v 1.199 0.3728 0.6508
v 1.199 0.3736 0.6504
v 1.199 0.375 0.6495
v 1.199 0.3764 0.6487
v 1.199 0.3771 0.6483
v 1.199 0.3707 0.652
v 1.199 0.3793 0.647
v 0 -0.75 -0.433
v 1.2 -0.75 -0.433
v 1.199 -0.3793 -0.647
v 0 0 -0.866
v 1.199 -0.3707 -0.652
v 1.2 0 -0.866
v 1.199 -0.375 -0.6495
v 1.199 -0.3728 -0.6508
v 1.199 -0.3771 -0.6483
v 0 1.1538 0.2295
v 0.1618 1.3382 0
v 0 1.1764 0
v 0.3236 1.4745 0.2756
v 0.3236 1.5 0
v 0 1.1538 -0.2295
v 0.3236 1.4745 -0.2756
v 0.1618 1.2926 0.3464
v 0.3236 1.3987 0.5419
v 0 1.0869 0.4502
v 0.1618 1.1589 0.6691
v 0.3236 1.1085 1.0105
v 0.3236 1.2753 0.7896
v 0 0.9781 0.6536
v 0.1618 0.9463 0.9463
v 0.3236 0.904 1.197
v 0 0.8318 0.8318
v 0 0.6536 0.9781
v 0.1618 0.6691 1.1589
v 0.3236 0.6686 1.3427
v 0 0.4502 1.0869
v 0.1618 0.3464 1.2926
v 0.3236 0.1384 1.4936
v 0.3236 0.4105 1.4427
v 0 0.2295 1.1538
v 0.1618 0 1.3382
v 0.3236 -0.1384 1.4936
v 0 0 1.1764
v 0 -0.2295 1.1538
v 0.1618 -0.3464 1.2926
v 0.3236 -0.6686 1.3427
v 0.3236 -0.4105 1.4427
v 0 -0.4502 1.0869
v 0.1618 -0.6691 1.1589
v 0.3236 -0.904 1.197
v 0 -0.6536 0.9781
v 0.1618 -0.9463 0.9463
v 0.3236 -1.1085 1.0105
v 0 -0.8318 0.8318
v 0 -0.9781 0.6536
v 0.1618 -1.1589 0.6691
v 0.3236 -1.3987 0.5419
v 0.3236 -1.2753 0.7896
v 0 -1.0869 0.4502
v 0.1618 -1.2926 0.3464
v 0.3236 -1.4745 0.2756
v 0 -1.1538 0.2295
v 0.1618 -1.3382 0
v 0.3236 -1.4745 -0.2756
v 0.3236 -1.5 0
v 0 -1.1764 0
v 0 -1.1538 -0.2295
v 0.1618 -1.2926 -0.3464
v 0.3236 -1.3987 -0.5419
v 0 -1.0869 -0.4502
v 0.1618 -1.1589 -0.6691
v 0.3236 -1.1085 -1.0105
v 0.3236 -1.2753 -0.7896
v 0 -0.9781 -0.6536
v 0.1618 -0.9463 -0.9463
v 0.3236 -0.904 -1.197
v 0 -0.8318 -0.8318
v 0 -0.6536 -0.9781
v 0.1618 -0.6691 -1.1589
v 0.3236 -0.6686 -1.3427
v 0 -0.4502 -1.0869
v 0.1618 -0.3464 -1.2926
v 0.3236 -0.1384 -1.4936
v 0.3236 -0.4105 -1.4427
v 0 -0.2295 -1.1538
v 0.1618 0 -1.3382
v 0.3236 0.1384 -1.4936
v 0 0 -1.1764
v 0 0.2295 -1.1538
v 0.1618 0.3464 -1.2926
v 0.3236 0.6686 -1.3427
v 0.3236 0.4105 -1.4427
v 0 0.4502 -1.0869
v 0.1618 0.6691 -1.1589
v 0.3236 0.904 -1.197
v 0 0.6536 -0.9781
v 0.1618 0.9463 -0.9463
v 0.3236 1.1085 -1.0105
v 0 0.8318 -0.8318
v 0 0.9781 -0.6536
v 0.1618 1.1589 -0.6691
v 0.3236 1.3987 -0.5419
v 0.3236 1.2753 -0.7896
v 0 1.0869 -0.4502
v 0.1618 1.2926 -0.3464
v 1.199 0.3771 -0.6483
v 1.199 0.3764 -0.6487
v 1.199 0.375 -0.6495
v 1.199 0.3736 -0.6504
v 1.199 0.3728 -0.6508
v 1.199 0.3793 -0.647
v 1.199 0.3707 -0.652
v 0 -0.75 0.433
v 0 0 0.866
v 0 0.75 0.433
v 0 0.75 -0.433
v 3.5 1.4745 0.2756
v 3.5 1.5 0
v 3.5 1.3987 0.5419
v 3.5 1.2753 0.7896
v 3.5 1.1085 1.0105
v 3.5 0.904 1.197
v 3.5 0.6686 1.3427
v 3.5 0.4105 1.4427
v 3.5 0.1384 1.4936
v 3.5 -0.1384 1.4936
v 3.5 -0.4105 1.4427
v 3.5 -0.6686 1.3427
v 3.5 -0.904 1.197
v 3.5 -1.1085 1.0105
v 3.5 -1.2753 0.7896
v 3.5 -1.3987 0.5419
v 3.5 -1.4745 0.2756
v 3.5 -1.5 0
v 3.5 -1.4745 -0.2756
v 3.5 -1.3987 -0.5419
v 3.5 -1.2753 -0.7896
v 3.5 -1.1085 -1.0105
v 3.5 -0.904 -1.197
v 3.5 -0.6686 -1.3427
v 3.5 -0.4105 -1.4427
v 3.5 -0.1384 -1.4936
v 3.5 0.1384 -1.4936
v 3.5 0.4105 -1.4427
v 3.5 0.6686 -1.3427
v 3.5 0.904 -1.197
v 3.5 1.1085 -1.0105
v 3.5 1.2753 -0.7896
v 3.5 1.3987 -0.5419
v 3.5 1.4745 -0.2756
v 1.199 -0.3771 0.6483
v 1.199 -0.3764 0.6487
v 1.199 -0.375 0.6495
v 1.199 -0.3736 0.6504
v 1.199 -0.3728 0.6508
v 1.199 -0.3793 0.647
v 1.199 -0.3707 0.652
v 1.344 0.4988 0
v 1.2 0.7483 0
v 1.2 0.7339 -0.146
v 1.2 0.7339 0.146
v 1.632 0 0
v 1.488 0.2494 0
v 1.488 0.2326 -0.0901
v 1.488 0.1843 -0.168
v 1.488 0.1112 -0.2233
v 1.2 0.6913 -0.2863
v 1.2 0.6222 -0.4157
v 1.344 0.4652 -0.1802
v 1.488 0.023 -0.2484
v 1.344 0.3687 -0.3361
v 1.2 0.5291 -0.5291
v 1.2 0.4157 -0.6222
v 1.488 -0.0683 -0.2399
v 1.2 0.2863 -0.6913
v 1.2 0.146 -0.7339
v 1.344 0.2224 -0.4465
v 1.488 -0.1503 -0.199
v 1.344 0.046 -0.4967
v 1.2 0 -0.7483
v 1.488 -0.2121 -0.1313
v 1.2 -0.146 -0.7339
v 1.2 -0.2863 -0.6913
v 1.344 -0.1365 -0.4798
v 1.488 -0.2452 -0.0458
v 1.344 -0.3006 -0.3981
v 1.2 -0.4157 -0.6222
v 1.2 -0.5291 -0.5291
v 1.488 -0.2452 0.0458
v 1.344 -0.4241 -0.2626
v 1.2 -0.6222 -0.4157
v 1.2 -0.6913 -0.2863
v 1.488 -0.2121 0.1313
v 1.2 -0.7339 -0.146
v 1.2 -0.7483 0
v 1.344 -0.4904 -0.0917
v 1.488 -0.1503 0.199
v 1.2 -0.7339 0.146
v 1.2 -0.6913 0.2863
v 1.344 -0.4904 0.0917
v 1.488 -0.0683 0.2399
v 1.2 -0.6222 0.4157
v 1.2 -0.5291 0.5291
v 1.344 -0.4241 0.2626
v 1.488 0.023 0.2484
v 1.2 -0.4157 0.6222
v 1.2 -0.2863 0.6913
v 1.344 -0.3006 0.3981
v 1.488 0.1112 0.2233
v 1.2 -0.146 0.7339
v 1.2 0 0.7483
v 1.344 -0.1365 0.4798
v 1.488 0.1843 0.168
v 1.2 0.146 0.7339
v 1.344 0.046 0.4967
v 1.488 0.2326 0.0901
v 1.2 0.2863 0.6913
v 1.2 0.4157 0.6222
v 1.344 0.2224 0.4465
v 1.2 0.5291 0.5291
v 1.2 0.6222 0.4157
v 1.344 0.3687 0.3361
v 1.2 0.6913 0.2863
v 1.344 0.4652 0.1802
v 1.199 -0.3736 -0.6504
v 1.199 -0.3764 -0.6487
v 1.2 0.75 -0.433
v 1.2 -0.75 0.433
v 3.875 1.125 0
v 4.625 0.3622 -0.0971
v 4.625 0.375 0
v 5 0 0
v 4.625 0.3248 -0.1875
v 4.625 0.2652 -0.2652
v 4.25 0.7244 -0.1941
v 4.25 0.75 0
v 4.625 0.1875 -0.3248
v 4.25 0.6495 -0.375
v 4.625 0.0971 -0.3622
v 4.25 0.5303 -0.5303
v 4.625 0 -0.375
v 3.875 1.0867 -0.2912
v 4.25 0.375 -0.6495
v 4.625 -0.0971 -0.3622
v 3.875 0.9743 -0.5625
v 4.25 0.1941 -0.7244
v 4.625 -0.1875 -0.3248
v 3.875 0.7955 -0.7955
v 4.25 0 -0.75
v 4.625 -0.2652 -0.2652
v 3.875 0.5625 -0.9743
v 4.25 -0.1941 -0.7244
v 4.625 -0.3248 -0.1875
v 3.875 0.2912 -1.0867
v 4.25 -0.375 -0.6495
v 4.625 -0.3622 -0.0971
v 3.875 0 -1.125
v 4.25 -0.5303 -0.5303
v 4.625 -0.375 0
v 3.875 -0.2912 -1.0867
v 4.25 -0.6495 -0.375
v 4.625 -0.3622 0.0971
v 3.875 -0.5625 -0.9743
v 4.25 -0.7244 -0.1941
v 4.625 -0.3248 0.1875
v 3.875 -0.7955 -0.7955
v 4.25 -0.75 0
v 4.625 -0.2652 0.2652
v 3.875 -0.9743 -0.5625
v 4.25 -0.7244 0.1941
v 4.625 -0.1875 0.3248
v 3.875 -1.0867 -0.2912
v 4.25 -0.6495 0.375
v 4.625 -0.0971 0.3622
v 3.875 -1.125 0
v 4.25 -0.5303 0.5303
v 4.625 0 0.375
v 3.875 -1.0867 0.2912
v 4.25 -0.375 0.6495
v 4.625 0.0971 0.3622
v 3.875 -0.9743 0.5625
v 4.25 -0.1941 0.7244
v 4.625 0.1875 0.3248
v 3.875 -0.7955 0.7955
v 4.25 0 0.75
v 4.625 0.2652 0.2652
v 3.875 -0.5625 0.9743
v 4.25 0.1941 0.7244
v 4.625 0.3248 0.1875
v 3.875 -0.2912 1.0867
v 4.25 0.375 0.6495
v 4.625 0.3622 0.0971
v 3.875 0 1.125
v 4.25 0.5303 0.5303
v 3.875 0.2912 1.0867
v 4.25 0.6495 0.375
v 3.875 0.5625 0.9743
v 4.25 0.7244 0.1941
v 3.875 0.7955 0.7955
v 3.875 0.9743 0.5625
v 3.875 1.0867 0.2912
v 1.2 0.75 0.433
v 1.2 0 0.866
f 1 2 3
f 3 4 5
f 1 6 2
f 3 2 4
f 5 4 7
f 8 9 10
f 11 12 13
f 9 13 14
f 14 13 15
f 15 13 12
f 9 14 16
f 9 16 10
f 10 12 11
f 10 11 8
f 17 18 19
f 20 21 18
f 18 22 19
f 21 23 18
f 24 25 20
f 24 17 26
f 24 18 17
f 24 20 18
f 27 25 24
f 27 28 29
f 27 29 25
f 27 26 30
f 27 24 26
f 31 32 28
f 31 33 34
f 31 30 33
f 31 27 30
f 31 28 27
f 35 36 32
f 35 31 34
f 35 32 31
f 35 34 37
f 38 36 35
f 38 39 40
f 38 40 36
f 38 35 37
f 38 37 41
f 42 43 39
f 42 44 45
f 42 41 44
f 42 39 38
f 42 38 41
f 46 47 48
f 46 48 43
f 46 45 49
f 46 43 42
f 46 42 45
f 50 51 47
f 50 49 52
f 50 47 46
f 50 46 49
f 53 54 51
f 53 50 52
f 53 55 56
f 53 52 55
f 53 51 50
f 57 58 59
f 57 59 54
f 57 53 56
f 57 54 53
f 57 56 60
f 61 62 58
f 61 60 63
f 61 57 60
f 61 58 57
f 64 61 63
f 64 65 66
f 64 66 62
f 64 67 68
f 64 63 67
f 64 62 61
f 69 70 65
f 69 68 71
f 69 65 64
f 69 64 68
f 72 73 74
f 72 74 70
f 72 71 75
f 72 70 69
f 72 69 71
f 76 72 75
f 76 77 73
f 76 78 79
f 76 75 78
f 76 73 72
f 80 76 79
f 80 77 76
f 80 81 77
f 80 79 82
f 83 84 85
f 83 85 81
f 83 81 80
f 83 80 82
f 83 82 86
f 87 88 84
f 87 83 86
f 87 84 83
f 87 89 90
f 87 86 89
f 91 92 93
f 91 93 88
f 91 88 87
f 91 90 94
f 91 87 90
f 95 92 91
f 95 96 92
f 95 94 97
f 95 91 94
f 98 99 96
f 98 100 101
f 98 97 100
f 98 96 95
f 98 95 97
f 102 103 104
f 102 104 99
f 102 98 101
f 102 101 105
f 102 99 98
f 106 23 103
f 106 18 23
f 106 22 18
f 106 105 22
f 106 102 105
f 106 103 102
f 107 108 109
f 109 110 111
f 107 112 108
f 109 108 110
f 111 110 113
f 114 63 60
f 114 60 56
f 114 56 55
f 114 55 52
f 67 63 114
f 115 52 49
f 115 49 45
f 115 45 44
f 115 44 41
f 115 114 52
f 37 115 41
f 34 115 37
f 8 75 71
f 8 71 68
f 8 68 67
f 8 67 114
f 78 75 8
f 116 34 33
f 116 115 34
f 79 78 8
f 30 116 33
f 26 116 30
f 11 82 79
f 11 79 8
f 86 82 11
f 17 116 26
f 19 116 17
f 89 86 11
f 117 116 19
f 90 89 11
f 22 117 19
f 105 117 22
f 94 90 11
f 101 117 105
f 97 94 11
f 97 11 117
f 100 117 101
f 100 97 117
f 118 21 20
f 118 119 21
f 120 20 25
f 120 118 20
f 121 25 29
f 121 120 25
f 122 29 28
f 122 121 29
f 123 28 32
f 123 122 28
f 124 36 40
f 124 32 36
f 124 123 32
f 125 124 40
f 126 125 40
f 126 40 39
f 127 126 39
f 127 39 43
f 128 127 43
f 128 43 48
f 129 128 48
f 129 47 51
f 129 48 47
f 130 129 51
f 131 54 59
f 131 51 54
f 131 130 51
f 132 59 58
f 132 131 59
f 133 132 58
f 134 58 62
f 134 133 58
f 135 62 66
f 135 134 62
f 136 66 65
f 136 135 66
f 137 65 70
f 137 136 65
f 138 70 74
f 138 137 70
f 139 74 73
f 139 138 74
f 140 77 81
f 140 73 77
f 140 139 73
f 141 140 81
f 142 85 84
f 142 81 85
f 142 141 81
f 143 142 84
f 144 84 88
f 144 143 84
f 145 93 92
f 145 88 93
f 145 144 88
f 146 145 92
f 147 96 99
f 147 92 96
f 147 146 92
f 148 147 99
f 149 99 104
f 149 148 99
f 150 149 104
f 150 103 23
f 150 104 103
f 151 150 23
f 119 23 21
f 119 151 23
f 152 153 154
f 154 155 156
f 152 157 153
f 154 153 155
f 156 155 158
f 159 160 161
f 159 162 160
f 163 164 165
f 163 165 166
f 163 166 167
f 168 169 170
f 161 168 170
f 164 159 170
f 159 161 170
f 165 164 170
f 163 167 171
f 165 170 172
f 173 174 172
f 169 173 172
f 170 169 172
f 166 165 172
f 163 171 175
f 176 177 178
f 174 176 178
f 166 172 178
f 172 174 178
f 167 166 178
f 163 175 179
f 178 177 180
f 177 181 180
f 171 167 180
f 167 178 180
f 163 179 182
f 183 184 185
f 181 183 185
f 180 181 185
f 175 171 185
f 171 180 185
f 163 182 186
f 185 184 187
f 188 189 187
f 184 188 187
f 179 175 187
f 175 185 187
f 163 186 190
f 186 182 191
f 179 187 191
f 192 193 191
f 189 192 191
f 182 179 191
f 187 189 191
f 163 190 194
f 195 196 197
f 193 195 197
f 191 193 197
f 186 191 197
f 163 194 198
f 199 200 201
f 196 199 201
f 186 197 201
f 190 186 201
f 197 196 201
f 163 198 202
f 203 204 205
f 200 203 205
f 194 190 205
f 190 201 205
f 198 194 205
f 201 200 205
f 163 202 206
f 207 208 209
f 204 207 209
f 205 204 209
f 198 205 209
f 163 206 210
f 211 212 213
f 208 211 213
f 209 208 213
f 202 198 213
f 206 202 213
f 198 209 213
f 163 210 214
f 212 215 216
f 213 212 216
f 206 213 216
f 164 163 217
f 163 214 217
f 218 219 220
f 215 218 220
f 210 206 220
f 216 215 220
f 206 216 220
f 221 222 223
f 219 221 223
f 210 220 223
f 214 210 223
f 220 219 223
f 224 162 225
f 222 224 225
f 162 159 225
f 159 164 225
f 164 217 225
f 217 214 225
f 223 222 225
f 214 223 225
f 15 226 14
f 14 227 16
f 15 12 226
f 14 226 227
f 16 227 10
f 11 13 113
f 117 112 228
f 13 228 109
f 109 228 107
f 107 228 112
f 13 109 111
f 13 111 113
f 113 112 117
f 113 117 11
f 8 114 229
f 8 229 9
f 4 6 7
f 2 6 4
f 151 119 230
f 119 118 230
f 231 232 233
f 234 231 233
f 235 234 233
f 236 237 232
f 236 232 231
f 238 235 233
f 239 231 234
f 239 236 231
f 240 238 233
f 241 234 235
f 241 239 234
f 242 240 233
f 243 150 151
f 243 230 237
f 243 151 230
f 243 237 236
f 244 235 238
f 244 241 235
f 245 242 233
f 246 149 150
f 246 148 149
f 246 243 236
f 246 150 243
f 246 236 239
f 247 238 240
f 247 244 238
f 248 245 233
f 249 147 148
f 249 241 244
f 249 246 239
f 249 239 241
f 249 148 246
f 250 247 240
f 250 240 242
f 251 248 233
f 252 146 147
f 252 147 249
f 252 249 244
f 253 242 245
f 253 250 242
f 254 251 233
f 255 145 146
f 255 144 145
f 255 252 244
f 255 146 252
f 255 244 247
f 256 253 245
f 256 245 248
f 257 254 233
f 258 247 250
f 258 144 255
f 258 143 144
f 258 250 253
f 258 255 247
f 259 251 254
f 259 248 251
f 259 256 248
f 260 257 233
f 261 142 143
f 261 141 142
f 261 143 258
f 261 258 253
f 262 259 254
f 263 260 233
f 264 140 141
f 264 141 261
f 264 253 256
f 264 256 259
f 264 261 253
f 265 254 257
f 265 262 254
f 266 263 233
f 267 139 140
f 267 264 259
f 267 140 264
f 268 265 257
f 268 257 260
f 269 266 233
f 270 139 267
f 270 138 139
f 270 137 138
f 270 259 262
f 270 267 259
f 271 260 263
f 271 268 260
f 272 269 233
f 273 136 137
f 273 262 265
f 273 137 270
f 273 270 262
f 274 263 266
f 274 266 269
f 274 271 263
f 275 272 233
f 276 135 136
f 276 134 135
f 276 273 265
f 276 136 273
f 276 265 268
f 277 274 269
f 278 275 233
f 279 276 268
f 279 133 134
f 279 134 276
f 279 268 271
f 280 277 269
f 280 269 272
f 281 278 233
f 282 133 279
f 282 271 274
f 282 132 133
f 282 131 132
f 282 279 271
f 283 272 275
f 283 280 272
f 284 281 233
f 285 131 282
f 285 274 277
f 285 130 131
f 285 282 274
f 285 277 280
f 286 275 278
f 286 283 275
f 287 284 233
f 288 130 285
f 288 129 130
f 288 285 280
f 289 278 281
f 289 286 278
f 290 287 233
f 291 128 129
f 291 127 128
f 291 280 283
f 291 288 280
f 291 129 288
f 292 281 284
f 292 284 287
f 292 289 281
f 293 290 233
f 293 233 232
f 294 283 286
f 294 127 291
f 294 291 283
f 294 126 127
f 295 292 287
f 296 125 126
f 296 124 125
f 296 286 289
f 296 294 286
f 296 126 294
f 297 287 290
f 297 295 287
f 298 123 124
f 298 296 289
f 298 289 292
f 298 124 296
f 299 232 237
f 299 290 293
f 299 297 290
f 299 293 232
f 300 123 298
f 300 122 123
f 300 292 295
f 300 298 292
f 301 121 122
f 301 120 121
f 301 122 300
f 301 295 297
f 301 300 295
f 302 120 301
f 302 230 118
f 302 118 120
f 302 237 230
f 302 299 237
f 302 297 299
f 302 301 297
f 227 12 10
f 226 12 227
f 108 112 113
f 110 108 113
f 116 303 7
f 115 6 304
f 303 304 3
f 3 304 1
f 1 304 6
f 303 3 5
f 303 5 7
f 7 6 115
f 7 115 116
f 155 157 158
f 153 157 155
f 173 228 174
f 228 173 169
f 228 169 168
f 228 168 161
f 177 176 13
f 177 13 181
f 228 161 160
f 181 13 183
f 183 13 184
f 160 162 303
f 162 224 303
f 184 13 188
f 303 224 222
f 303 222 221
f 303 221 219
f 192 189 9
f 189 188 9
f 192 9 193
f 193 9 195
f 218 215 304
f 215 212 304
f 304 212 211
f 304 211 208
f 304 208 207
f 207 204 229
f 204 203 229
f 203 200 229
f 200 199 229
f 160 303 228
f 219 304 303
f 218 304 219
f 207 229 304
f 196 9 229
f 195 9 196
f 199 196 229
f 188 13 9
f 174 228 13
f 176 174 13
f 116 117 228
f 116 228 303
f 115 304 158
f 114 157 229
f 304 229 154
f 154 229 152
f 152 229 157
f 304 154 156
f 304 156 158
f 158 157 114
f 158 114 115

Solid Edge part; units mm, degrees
sketch "Sketch1" plane through (0, 0, 0) normal (0, 0, 1) x (1, 0, 0)
  line L0 (0, 0) -> (0, 1.1764)
  line L1 (0, 1.1764) -> (0.3236, 1.5)
  line L2 (0.3236, 1.5) -> (3.5, 1.5)
  line L3 (3.5, 1.5) -> (5, 0)
  line L4 (5, 0) -> (0, 0)
revolve "RevolvedProtrusion1" add sketch "Sketch1" angle 360 about axis through (5, 0, 0) along (-1, 0, 0)
cosmetic_thread "Thread1" size "M3"
sketch "Sketch2" plane through (0, 0, 0) normal (1, 0, 0) x (0, 1, 0)
  line L0 (0, 0.866) -> (-0.75, 0.433)
  line L1 (-0.75, 0.433) -> (-0.75, -0.433)
  line L2 (-0.75, -0.433) -> (0, -0.866)
  line L3 (0, -0.866) -> (0.75, -0.433)
  line L4 (0.75, -0.433) -> (0.75, 0.433)
  line L5 (0.75, 0.433) -> (0, 0.866)
extrude "Cutout1" cut sketch "Sketch2" along normal blind 1.2
sketch "Sketch3" plane through (0, 0, 0) normal (0, 0, 1) x (1, 0, 0)
  line L0 (1.199, 0) -> (1.199, 0.75)
  line L1 (1.199, 0.75) -> (1.632, 0)
  line L2 (1.632, 0) -> (1.199, 0)
revolve "RevolvedCutout1" cut sketch "Sketch3" angle 360 about axis through (1.632, 0, 0) along (-1, 0, 0)
properties part number "K0797.03X5"
